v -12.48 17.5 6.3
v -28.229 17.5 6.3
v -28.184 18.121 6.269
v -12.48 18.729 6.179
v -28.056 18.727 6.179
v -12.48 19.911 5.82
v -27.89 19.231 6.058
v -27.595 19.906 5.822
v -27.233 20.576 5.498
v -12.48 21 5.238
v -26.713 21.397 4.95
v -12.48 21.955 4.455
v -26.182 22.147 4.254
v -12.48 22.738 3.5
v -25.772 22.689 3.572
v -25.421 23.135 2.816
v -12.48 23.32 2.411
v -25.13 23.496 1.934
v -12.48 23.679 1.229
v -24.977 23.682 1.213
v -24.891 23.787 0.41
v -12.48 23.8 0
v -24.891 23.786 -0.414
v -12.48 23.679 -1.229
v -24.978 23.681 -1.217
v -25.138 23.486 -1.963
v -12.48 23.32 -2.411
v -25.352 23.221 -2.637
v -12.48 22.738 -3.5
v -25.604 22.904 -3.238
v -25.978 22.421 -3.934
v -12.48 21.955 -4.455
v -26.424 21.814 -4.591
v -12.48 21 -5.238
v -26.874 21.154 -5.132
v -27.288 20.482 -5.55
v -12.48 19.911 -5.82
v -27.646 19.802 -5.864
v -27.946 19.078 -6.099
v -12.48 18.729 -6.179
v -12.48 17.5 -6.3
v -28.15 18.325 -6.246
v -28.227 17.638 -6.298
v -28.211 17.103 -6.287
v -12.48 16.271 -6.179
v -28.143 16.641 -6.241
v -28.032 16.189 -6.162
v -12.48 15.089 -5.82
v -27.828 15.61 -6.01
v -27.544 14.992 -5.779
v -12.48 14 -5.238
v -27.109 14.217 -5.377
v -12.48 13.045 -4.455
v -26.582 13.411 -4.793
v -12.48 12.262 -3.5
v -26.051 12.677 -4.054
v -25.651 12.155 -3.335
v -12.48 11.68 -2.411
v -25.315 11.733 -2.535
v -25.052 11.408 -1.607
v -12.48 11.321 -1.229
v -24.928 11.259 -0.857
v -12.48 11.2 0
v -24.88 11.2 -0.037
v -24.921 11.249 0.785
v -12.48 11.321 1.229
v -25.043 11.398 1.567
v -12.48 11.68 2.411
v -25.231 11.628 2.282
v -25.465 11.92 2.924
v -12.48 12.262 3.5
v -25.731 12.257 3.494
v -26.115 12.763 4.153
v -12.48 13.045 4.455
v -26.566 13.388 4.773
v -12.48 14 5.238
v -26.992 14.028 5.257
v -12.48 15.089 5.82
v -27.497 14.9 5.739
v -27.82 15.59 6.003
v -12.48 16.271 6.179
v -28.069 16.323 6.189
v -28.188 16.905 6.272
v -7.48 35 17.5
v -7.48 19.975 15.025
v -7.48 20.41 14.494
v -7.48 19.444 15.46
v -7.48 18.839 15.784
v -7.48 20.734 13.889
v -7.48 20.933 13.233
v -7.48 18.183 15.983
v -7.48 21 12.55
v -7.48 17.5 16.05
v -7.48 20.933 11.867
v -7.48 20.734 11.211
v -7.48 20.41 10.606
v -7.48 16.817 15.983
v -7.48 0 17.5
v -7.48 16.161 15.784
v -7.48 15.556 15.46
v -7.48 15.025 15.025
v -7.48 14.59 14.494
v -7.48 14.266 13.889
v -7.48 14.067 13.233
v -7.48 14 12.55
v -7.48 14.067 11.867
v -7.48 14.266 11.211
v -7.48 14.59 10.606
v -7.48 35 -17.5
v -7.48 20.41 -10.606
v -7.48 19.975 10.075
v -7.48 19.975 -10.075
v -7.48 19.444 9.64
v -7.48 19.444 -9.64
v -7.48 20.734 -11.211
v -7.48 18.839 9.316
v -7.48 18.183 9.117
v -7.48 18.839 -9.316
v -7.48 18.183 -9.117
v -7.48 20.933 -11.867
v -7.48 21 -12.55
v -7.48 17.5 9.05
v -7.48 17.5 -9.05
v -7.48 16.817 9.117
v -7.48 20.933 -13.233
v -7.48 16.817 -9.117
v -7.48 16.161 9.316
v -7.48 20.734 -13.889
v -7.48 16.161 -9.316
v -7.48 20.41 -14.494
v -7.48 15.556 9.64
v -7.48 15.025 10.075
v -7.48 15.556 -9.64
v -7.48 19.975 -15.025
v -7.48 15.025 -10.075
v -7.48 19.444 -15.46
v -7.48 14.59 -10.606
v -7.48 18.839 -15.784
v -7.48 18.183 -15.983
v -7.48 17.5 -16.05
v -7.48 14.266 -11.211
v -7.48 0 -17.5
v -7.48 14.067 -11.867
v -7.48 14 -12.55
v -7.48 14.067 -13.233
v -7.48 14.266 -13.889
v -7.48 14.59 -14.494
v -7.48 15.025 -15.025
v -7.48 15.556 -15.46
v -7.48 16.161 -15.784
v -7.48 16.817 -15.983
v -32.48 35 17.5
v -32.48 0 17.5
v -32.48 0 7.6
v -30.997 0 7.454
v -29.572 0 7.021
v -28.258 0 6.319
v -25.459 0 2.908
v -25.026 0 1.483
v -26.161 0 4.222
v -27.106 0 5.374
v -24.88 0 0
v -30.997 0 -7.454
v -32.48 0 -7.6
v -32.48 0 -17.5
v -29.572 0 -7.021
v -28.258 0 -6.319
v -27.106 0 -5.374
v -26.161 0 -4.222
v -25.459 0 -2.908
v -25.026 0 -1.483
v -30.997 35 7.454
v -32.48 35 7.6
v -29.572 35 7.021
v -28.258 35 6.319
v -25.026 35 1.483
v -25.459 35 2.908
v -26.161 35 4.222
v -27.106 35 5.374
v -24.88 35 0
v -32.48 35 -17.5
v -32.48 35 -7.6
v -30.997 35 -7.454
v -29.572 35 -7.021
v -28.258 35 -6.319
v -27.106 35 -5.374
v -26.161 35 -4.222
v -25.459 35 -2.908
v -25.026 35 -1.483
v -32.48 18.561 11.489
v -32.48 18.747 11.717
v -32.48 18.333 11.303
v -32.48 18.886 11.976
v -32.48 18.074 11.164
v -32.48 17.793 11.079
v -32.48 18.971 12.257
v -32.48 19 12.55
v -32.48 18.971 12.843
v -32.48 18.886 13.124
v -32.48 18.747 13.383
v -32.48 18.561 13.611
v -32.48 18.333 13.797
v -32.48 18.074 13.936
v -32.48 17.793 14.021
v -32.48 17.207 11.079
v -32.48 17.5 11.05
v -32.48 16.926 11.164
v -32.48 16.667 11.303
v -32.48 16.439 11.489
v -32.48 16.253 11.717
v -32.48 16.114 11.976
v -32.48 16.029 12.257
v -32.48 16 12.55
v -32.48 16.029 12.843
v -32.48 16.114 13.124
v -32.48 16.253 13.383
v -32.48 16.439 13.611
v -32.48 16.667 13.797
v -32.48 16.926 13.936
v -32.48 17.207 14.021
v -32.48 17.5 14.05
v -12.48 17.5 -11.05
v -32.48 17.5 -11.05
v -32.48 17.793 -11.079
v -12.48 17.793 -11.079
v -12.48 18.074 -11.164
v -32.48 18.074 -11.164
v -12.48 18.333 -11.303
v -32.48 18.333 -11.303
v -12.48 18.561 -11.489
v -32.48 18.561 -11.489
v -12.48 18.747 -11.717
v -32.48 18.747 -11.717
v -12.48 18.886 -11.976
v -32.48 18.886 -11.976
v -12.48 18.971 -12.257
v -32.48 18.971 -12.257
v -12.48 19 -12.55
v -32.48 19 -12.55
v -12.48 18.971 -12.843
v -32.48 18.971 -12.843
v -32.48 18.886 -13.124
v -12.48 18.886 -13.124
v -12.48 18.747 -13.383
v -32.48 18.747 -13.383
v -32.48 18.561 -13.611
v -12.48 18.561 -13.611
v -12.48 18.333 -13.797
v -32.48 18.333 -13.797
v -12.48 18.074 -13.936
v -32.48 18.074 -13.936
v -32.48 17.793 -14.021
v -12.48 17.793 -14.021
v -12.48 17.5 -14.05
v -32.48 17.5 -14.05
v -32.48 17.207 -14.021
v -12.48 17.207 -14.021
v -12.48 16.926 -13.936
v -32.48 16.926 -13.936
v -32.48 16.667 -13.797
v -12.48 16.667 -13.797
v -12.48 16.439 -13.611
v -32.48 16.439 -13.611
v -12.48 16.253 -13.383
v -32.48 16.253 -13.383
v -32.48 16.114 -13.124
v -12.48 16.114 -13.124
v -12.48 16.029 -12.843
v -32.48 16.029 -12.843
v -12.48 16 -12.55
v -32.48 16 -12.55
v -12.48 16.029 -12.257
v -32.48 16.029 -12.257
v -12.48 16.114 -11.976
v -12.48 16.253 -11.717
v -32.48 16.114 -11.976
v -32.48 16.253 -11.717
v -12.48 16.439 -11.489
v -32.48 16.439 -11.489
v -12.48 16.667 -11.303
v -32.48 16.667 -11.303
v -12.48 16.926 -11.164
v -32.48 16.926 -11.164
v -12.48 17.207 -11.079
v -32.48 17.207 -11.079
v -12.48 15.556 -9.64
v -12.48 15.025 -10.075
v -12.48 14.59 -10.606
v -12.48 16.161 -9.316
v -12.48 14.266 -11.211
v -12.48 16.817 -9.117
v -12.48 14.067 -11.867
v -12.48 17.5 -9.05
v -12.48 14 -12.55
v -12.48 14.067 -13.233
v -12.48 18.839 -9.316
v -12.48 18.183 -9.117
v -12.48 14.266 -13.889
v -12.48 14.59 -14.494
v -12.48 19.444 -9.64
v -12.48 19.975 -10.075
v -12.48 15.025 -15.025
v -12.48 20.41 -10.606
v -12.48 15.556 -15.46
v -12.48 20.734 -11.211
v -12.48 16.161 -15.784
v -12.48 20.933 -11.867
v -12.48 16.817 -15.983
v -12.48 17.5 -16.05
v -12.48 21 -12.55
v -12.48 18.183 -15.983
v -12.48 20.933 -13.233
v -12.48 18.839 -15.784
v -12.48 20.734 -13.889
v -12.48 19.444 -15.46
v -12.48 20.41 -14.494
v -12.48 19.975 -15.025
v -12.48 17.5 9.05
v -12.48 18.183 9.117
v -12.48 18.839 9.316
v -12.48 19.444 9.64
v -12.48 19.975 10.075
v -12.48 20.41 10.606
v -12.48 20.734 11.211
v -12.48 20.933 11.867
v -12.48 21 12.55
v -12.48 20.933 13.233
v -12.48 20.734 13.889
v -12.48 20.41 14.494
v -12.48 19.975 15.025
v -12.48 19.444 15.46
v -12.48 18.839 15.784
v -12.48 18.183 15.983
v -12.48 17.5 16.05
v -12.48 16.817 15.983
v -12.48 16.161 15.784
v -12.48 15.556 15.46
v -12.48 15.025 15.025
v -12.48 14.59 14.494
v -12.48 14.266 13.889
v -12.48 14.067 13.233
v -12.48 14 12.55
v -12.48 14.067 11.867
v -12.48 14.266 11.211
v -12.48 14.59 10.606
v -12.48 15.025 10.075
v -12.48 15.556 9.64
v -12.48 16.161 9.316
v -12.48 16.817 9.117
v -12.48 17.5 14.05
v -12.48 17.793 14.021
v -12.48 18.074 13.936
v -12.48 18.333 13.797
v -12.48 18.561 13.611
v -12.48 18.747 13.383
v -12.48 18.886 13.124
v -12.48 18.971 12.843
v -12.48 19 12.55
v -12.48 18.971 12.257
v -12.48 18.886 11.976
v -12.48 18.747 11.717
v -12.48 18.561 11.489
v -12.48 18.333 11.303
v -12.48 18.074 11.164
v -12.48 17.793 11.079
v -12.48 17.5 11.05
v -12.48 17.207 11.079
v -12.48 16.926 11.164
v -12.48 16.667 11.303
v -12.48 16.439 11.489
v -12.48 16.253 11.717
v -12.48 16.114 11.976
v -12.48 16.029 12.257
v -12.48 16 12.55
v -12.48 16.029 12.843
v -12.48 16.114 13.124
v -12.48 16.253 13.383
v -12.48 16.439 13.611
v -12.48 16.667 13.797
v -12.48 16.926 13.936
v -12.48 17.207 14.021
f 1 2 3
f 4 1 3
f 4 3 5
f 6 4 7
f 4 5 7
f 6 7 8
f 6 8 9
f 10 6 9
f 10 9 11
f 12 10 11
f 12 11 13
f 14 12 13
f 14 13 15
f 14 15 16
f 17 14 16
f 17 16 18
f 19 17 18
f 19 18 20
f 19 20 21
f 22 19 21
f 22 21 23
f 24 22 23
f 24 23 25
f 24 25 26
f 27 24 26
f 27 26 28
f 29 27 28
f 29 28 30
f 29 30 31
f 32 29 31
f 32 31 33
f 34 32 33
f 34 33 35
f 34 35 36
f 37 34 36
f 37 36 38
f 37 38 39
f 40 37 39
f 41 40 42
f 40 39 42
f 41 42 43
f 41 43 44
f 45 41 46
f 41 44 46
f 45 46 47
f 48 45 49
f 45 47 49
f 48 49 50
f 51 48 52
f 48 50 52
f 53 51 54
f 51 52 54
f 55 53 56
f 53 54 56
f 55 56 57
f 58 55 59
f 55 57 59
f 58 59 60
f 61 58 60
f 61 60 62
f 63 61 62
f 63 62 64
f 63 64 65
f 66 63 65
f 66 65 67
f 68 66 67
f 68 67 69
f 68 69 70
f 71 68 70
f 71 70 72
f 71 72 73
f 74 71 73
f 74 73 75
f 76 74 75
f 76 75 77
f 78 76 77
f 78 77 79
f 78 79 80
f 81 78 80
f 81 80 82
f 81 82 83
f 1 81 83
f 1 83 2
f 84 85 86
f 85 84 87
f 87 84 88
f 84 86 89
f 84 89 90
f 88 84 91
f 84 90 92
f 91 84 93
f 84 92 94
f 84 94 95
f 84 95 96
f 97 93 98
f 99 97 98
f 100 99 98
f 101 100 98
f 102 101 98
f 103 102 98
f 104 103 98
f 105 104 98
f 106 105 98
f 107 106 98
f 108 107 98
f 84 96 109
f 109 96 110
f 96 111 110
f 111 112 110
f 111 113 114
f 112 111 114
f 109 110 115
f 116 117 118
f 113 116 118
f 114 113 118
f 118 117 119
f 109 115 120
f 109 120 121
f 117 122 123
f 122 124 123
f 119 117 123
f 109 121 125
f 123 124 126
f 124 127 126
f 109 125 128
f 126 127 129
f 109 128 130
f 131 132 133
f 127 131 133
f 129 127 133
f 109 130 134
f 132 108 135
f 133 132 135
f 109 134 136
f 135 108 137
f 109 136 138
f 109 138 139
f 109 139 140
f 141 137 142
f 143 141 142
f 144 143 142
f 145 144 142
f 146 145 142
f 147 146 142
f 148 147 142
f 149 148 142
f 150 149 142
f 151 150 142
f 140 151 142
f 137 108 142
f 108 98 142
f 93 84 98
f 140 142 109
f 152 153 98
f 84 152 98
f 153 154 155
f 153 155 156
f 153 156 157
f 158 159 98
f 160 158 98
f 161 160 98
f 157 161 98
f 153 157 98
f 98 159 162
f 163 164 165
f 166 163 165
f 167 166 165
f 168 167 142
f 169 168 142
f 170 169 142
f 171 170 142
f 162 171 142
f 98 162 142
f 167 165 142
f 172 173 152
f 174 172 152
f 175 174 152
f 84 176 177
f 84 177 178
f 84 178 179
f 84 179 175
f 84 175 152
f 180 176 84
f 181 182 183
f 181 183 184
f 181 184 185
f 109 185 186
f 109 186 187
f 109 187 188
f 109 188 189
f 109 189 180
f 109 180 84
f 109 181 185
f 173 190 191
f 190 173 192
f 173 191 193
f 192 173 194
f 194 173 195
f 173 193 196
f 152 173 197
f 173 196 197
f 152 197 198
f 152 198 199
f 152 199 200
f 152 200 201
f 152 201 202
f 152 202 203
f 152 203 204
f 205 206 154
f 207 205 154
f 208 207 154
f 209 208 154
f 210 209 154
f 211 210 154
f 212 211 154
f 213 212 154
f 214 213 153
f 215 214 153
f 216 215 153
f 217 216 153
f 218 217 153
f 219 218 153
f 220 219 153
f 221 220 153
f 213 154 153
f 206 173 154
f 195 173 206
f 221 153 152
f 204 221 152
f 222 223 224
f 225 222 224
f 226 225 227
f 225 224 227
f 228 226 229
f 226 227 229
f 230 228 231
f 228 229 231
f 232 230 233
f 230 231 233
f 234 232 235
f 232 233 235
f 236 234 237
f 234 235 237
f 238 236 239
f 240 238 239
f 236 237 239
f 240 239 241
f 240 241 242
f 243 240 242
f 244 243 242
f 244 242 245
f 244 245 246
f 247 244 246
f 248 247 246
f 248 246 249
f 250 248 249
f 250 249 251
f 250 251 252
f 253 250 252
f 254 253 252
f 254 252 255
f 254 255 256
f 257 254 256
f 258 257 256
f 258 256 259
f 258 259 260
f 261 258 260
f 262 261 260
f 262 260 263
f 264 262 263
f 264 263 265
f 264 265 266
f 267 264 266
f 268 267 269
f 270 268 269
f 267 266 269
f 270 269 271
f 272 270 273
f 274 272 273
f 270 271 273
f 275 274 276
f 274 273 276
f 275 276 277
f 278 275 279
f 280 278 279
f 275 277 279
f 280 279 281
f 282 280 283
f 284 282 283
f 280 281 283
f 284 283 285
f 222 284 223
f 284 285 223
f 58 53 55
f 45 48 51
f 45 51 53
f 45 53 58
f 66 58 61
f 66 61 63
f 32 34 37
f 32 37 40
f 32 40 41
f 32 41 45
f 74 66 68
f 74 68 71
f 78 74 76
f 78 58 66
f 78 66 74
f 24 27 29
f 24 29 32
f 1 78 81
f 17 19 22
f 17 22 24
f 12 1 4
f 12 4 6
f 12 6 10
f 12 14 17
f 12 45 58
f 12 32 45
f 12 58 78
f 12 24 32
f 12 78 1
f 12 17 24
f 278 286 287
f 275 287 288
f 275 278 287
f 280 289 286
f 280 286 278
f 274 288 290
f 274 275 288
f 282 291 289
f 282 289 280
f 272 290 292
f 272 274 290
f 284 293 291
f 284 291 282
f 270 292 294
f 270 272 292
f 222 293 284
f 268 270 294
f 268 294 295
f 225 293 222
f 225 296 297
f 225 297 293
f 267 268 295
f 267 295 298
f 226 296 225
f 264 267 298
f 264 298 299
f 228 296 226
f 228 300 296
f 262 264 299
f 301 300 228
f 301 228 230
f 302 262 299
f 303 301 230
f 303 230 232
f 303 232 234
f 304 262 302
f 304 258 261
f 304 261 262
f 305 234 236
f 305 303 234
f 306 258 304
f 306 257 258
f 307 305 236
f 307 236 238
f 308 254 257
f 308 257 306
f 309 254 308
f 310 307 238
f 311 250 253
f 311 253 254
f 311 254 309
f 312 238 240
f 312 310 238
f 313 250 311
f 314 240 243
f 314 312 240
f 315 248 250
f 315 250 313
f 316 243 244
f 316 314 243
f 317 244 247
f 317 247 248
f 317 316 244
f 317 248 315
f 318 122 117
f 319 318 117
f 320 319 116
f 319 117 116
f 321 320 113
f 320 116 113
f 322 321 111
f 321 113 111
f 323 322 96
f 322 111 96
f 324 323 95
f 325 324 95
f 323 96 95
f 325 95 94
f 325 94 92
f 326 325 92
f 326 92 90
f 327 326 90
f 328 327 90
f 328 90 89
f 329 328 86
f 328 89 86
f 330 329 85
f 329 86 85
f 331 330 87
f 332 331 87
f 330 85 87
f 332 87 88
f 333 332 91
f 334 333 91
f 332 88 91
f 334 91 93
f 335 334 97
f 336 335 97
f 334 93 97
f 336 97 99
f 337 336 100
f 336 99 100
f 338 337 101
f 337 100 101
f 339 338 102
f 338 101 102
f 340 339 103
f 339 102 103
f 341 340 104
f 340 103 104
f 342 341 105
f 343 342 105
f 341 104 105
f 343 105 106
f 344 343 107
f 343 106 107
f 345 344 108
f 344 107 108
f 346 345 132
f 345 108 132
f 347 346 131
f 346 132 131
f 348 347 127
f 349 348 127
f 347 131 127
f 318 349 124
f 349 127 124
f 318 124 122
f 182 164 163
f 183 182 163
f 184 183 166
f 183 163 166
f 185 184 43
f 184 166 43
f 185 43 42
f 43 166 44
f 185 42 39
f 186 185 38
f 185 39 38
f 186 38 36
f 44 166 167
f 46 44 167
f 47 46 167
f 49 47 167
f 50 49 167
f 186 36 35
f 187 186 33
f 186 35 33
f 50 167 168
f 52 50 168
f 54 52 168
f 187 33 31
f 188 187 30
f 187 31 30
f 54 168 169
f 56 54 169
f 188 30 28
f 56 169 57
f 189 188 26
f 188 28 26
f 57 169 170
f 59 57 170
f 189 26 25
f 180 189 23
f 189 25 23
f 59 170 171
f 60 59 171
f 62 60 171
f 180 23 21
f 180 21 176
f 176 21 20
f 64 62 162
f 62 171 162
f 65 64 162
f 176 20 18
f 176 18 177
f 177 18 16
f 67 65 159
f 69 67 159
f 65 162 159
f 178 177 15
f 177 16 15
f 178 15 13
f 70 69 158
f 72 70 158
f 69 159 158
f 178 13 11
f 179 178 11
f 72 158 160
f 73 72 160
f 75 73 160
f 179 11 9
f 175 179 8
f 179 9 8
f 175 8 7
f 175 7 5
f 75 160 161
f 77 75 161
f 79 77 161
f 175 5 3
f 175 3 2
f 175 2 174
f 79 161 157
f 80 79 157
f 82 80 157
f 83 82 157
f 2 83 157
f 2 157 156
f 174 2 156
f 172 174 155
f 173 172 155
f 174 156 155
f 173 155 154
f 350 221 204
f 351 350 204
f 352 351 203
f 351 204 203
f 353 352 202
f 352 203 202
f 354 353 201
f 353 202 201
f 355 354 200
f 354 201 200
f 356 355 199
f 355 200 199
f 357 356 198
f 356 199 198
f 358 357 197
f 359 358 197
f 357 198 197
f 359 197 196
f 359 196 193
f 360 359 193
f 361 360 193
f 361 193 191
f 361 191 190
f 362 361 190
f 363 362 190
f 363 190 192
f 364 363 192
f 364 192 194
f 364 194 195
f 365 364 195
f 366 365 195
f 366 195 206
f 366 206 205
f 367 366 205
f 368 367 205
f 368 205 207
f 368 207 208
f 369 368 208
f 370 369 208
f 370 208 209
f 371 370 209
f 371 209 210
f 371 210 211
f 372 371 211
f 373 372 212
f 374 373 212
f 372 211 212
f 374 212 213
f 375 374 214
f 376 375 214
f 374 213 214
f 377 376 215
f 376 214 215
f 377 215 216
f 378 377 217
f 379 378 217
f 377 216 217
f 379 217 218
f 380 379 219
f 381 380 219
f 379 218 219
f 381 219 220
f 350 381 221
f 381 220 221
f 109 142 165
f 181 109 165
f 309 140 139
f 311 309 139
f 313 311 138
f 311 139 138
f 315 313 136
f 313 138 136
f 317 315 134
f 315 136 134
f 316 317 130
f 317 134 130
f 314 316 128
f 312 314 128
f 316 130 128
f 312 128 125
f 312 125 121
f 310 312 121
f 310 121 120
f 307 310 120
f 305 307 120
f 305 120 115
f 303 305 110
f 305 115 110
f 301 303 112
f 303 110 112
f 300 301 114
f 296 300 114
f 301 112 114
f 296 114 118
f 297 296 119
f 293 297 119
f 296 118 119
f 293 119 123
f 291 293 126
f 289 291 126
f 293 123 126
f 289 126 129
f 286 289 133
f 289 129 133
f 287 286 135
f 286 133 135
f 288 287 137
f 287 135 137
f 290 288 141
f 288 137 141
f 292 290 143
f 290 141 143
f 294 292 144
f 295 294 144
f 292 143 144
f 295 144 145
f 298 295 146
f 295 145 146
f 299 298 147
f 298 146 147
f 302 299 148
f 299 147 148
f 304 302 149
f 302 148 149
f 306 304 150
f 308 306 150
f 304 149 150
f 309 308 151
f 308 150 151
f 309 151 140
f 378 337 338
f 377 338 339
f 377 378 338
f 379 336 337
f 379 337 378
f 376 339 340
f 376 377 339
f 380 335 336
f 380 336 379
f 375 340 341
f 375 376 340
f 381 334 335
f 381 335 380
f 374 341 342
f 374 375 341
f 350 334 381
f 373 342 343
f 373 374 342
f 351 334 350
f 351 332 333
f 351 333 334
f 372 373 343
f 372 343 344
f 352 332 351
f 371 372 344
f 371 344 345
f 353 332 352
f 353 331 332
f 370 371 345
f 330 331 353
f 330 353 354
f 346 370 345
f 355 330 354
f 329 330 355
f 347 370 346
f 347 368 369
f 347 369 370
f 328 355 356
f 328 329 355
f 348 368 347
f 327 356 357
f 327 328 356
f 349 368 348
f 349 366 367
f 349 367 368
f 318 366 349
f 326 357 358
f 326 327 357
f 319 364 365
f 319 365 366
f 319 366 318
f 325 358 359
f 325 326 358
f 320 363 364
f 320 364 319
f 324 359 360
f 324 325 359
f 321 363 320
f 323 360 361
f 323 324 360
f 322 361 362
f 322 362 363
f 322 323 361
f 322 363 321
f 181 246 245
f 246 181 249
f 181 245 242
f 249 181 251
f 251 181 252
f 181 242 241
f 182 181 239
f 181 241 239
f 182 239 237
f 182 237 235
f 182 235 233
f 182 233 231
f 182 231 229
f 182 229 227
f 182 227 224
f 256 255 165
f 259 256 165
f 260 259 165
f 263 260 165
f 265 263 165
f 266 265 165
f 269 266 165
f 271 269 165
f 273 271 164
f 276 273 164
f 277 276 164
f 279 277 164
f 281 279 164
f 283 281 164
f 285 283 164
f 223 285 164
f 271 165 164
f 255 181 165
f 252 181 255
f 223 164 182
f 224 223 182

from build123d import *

# Parameters (mm, degrees)
BOSS_EXTRUDE1_DEPTH = 35
SKETCH3_R           = 6.3
CUT_EXTRUDE1_DEPTH  = 20
SKETCH4_R           = 1.5
CUT_EXTRUDE2_DEPTH  = 47.435439128
SKETCH5_R           = 3.5
CUT_EXTRUDE3_DEPTH  = 5


with BuildPart() as part:
    # Sketch1 → Boss-Extrude1 (new body)
    with BuildSketch(Plane(origin=(0, 0, 0), x_dir=(1, 0, 0), z_dir=(0, 1, 0))):
        with BuildLine():
            Line((-32.48, -7.6), (-32.48, -17.5))
            Line((-32.48, -17.5), (-7.48, -17.5))
            Line((-7.48, -17.5), (-7.48, 17.5))
            Line((-7.48, 17.5), (-32.48, 17.5))
            Line((-32.48, 17.5), (-32.48, 7.6))
            ThreePointArc((-32.48, 7.6), (-24.88, 0), (-32.48, -7.6))
        make_face()
    extrude(amount=BOSS_EXTRUDE1_DEPTH)

    # Sketch3 → Cut-Extrude1 (cut)
    with BuildSketch(Plane.ZY.offset(32.48)):
        with Locations((0, 17.5)):
            Circle(SKETCH3_R)
    extrude(amount=-CUT_EXTRUDE1_DEPTH, mode=Mode.SUBTRACT)

    # Sketch4 → Cut-Extrude2 (cut, through all)
    with BuildSketch(Plane.ZY.offset(32.48)):
        with Locations((12.55, 17.5)):
            Circle(SKETCH4_R)
        with Locations((-12.55, 17.5)):
            Circle(SKETCH4_R)
    extrude(amount=-CUT_EXTRUDE2_DEPTH, mode=Mode.SUBTRACT)

    # Sketch5 → Cut-Extrude3 (cut)
    with BuildSketch(Plane(origin=(-7.48, 0, 0), x_dir=(0, 0, -1), z_dir=(1, 0, 0))):
        with Locations((-12.55, 17.5)):
            Circle(SKETCH5_R)
        with Locations((12.55, 17.5)):
            Circle(SKETCH5_R)
    extrude(amount=-CUT_EXTRUDE3_DEPTH, mode=Mode.SUBTRACT)


solid = part.part
